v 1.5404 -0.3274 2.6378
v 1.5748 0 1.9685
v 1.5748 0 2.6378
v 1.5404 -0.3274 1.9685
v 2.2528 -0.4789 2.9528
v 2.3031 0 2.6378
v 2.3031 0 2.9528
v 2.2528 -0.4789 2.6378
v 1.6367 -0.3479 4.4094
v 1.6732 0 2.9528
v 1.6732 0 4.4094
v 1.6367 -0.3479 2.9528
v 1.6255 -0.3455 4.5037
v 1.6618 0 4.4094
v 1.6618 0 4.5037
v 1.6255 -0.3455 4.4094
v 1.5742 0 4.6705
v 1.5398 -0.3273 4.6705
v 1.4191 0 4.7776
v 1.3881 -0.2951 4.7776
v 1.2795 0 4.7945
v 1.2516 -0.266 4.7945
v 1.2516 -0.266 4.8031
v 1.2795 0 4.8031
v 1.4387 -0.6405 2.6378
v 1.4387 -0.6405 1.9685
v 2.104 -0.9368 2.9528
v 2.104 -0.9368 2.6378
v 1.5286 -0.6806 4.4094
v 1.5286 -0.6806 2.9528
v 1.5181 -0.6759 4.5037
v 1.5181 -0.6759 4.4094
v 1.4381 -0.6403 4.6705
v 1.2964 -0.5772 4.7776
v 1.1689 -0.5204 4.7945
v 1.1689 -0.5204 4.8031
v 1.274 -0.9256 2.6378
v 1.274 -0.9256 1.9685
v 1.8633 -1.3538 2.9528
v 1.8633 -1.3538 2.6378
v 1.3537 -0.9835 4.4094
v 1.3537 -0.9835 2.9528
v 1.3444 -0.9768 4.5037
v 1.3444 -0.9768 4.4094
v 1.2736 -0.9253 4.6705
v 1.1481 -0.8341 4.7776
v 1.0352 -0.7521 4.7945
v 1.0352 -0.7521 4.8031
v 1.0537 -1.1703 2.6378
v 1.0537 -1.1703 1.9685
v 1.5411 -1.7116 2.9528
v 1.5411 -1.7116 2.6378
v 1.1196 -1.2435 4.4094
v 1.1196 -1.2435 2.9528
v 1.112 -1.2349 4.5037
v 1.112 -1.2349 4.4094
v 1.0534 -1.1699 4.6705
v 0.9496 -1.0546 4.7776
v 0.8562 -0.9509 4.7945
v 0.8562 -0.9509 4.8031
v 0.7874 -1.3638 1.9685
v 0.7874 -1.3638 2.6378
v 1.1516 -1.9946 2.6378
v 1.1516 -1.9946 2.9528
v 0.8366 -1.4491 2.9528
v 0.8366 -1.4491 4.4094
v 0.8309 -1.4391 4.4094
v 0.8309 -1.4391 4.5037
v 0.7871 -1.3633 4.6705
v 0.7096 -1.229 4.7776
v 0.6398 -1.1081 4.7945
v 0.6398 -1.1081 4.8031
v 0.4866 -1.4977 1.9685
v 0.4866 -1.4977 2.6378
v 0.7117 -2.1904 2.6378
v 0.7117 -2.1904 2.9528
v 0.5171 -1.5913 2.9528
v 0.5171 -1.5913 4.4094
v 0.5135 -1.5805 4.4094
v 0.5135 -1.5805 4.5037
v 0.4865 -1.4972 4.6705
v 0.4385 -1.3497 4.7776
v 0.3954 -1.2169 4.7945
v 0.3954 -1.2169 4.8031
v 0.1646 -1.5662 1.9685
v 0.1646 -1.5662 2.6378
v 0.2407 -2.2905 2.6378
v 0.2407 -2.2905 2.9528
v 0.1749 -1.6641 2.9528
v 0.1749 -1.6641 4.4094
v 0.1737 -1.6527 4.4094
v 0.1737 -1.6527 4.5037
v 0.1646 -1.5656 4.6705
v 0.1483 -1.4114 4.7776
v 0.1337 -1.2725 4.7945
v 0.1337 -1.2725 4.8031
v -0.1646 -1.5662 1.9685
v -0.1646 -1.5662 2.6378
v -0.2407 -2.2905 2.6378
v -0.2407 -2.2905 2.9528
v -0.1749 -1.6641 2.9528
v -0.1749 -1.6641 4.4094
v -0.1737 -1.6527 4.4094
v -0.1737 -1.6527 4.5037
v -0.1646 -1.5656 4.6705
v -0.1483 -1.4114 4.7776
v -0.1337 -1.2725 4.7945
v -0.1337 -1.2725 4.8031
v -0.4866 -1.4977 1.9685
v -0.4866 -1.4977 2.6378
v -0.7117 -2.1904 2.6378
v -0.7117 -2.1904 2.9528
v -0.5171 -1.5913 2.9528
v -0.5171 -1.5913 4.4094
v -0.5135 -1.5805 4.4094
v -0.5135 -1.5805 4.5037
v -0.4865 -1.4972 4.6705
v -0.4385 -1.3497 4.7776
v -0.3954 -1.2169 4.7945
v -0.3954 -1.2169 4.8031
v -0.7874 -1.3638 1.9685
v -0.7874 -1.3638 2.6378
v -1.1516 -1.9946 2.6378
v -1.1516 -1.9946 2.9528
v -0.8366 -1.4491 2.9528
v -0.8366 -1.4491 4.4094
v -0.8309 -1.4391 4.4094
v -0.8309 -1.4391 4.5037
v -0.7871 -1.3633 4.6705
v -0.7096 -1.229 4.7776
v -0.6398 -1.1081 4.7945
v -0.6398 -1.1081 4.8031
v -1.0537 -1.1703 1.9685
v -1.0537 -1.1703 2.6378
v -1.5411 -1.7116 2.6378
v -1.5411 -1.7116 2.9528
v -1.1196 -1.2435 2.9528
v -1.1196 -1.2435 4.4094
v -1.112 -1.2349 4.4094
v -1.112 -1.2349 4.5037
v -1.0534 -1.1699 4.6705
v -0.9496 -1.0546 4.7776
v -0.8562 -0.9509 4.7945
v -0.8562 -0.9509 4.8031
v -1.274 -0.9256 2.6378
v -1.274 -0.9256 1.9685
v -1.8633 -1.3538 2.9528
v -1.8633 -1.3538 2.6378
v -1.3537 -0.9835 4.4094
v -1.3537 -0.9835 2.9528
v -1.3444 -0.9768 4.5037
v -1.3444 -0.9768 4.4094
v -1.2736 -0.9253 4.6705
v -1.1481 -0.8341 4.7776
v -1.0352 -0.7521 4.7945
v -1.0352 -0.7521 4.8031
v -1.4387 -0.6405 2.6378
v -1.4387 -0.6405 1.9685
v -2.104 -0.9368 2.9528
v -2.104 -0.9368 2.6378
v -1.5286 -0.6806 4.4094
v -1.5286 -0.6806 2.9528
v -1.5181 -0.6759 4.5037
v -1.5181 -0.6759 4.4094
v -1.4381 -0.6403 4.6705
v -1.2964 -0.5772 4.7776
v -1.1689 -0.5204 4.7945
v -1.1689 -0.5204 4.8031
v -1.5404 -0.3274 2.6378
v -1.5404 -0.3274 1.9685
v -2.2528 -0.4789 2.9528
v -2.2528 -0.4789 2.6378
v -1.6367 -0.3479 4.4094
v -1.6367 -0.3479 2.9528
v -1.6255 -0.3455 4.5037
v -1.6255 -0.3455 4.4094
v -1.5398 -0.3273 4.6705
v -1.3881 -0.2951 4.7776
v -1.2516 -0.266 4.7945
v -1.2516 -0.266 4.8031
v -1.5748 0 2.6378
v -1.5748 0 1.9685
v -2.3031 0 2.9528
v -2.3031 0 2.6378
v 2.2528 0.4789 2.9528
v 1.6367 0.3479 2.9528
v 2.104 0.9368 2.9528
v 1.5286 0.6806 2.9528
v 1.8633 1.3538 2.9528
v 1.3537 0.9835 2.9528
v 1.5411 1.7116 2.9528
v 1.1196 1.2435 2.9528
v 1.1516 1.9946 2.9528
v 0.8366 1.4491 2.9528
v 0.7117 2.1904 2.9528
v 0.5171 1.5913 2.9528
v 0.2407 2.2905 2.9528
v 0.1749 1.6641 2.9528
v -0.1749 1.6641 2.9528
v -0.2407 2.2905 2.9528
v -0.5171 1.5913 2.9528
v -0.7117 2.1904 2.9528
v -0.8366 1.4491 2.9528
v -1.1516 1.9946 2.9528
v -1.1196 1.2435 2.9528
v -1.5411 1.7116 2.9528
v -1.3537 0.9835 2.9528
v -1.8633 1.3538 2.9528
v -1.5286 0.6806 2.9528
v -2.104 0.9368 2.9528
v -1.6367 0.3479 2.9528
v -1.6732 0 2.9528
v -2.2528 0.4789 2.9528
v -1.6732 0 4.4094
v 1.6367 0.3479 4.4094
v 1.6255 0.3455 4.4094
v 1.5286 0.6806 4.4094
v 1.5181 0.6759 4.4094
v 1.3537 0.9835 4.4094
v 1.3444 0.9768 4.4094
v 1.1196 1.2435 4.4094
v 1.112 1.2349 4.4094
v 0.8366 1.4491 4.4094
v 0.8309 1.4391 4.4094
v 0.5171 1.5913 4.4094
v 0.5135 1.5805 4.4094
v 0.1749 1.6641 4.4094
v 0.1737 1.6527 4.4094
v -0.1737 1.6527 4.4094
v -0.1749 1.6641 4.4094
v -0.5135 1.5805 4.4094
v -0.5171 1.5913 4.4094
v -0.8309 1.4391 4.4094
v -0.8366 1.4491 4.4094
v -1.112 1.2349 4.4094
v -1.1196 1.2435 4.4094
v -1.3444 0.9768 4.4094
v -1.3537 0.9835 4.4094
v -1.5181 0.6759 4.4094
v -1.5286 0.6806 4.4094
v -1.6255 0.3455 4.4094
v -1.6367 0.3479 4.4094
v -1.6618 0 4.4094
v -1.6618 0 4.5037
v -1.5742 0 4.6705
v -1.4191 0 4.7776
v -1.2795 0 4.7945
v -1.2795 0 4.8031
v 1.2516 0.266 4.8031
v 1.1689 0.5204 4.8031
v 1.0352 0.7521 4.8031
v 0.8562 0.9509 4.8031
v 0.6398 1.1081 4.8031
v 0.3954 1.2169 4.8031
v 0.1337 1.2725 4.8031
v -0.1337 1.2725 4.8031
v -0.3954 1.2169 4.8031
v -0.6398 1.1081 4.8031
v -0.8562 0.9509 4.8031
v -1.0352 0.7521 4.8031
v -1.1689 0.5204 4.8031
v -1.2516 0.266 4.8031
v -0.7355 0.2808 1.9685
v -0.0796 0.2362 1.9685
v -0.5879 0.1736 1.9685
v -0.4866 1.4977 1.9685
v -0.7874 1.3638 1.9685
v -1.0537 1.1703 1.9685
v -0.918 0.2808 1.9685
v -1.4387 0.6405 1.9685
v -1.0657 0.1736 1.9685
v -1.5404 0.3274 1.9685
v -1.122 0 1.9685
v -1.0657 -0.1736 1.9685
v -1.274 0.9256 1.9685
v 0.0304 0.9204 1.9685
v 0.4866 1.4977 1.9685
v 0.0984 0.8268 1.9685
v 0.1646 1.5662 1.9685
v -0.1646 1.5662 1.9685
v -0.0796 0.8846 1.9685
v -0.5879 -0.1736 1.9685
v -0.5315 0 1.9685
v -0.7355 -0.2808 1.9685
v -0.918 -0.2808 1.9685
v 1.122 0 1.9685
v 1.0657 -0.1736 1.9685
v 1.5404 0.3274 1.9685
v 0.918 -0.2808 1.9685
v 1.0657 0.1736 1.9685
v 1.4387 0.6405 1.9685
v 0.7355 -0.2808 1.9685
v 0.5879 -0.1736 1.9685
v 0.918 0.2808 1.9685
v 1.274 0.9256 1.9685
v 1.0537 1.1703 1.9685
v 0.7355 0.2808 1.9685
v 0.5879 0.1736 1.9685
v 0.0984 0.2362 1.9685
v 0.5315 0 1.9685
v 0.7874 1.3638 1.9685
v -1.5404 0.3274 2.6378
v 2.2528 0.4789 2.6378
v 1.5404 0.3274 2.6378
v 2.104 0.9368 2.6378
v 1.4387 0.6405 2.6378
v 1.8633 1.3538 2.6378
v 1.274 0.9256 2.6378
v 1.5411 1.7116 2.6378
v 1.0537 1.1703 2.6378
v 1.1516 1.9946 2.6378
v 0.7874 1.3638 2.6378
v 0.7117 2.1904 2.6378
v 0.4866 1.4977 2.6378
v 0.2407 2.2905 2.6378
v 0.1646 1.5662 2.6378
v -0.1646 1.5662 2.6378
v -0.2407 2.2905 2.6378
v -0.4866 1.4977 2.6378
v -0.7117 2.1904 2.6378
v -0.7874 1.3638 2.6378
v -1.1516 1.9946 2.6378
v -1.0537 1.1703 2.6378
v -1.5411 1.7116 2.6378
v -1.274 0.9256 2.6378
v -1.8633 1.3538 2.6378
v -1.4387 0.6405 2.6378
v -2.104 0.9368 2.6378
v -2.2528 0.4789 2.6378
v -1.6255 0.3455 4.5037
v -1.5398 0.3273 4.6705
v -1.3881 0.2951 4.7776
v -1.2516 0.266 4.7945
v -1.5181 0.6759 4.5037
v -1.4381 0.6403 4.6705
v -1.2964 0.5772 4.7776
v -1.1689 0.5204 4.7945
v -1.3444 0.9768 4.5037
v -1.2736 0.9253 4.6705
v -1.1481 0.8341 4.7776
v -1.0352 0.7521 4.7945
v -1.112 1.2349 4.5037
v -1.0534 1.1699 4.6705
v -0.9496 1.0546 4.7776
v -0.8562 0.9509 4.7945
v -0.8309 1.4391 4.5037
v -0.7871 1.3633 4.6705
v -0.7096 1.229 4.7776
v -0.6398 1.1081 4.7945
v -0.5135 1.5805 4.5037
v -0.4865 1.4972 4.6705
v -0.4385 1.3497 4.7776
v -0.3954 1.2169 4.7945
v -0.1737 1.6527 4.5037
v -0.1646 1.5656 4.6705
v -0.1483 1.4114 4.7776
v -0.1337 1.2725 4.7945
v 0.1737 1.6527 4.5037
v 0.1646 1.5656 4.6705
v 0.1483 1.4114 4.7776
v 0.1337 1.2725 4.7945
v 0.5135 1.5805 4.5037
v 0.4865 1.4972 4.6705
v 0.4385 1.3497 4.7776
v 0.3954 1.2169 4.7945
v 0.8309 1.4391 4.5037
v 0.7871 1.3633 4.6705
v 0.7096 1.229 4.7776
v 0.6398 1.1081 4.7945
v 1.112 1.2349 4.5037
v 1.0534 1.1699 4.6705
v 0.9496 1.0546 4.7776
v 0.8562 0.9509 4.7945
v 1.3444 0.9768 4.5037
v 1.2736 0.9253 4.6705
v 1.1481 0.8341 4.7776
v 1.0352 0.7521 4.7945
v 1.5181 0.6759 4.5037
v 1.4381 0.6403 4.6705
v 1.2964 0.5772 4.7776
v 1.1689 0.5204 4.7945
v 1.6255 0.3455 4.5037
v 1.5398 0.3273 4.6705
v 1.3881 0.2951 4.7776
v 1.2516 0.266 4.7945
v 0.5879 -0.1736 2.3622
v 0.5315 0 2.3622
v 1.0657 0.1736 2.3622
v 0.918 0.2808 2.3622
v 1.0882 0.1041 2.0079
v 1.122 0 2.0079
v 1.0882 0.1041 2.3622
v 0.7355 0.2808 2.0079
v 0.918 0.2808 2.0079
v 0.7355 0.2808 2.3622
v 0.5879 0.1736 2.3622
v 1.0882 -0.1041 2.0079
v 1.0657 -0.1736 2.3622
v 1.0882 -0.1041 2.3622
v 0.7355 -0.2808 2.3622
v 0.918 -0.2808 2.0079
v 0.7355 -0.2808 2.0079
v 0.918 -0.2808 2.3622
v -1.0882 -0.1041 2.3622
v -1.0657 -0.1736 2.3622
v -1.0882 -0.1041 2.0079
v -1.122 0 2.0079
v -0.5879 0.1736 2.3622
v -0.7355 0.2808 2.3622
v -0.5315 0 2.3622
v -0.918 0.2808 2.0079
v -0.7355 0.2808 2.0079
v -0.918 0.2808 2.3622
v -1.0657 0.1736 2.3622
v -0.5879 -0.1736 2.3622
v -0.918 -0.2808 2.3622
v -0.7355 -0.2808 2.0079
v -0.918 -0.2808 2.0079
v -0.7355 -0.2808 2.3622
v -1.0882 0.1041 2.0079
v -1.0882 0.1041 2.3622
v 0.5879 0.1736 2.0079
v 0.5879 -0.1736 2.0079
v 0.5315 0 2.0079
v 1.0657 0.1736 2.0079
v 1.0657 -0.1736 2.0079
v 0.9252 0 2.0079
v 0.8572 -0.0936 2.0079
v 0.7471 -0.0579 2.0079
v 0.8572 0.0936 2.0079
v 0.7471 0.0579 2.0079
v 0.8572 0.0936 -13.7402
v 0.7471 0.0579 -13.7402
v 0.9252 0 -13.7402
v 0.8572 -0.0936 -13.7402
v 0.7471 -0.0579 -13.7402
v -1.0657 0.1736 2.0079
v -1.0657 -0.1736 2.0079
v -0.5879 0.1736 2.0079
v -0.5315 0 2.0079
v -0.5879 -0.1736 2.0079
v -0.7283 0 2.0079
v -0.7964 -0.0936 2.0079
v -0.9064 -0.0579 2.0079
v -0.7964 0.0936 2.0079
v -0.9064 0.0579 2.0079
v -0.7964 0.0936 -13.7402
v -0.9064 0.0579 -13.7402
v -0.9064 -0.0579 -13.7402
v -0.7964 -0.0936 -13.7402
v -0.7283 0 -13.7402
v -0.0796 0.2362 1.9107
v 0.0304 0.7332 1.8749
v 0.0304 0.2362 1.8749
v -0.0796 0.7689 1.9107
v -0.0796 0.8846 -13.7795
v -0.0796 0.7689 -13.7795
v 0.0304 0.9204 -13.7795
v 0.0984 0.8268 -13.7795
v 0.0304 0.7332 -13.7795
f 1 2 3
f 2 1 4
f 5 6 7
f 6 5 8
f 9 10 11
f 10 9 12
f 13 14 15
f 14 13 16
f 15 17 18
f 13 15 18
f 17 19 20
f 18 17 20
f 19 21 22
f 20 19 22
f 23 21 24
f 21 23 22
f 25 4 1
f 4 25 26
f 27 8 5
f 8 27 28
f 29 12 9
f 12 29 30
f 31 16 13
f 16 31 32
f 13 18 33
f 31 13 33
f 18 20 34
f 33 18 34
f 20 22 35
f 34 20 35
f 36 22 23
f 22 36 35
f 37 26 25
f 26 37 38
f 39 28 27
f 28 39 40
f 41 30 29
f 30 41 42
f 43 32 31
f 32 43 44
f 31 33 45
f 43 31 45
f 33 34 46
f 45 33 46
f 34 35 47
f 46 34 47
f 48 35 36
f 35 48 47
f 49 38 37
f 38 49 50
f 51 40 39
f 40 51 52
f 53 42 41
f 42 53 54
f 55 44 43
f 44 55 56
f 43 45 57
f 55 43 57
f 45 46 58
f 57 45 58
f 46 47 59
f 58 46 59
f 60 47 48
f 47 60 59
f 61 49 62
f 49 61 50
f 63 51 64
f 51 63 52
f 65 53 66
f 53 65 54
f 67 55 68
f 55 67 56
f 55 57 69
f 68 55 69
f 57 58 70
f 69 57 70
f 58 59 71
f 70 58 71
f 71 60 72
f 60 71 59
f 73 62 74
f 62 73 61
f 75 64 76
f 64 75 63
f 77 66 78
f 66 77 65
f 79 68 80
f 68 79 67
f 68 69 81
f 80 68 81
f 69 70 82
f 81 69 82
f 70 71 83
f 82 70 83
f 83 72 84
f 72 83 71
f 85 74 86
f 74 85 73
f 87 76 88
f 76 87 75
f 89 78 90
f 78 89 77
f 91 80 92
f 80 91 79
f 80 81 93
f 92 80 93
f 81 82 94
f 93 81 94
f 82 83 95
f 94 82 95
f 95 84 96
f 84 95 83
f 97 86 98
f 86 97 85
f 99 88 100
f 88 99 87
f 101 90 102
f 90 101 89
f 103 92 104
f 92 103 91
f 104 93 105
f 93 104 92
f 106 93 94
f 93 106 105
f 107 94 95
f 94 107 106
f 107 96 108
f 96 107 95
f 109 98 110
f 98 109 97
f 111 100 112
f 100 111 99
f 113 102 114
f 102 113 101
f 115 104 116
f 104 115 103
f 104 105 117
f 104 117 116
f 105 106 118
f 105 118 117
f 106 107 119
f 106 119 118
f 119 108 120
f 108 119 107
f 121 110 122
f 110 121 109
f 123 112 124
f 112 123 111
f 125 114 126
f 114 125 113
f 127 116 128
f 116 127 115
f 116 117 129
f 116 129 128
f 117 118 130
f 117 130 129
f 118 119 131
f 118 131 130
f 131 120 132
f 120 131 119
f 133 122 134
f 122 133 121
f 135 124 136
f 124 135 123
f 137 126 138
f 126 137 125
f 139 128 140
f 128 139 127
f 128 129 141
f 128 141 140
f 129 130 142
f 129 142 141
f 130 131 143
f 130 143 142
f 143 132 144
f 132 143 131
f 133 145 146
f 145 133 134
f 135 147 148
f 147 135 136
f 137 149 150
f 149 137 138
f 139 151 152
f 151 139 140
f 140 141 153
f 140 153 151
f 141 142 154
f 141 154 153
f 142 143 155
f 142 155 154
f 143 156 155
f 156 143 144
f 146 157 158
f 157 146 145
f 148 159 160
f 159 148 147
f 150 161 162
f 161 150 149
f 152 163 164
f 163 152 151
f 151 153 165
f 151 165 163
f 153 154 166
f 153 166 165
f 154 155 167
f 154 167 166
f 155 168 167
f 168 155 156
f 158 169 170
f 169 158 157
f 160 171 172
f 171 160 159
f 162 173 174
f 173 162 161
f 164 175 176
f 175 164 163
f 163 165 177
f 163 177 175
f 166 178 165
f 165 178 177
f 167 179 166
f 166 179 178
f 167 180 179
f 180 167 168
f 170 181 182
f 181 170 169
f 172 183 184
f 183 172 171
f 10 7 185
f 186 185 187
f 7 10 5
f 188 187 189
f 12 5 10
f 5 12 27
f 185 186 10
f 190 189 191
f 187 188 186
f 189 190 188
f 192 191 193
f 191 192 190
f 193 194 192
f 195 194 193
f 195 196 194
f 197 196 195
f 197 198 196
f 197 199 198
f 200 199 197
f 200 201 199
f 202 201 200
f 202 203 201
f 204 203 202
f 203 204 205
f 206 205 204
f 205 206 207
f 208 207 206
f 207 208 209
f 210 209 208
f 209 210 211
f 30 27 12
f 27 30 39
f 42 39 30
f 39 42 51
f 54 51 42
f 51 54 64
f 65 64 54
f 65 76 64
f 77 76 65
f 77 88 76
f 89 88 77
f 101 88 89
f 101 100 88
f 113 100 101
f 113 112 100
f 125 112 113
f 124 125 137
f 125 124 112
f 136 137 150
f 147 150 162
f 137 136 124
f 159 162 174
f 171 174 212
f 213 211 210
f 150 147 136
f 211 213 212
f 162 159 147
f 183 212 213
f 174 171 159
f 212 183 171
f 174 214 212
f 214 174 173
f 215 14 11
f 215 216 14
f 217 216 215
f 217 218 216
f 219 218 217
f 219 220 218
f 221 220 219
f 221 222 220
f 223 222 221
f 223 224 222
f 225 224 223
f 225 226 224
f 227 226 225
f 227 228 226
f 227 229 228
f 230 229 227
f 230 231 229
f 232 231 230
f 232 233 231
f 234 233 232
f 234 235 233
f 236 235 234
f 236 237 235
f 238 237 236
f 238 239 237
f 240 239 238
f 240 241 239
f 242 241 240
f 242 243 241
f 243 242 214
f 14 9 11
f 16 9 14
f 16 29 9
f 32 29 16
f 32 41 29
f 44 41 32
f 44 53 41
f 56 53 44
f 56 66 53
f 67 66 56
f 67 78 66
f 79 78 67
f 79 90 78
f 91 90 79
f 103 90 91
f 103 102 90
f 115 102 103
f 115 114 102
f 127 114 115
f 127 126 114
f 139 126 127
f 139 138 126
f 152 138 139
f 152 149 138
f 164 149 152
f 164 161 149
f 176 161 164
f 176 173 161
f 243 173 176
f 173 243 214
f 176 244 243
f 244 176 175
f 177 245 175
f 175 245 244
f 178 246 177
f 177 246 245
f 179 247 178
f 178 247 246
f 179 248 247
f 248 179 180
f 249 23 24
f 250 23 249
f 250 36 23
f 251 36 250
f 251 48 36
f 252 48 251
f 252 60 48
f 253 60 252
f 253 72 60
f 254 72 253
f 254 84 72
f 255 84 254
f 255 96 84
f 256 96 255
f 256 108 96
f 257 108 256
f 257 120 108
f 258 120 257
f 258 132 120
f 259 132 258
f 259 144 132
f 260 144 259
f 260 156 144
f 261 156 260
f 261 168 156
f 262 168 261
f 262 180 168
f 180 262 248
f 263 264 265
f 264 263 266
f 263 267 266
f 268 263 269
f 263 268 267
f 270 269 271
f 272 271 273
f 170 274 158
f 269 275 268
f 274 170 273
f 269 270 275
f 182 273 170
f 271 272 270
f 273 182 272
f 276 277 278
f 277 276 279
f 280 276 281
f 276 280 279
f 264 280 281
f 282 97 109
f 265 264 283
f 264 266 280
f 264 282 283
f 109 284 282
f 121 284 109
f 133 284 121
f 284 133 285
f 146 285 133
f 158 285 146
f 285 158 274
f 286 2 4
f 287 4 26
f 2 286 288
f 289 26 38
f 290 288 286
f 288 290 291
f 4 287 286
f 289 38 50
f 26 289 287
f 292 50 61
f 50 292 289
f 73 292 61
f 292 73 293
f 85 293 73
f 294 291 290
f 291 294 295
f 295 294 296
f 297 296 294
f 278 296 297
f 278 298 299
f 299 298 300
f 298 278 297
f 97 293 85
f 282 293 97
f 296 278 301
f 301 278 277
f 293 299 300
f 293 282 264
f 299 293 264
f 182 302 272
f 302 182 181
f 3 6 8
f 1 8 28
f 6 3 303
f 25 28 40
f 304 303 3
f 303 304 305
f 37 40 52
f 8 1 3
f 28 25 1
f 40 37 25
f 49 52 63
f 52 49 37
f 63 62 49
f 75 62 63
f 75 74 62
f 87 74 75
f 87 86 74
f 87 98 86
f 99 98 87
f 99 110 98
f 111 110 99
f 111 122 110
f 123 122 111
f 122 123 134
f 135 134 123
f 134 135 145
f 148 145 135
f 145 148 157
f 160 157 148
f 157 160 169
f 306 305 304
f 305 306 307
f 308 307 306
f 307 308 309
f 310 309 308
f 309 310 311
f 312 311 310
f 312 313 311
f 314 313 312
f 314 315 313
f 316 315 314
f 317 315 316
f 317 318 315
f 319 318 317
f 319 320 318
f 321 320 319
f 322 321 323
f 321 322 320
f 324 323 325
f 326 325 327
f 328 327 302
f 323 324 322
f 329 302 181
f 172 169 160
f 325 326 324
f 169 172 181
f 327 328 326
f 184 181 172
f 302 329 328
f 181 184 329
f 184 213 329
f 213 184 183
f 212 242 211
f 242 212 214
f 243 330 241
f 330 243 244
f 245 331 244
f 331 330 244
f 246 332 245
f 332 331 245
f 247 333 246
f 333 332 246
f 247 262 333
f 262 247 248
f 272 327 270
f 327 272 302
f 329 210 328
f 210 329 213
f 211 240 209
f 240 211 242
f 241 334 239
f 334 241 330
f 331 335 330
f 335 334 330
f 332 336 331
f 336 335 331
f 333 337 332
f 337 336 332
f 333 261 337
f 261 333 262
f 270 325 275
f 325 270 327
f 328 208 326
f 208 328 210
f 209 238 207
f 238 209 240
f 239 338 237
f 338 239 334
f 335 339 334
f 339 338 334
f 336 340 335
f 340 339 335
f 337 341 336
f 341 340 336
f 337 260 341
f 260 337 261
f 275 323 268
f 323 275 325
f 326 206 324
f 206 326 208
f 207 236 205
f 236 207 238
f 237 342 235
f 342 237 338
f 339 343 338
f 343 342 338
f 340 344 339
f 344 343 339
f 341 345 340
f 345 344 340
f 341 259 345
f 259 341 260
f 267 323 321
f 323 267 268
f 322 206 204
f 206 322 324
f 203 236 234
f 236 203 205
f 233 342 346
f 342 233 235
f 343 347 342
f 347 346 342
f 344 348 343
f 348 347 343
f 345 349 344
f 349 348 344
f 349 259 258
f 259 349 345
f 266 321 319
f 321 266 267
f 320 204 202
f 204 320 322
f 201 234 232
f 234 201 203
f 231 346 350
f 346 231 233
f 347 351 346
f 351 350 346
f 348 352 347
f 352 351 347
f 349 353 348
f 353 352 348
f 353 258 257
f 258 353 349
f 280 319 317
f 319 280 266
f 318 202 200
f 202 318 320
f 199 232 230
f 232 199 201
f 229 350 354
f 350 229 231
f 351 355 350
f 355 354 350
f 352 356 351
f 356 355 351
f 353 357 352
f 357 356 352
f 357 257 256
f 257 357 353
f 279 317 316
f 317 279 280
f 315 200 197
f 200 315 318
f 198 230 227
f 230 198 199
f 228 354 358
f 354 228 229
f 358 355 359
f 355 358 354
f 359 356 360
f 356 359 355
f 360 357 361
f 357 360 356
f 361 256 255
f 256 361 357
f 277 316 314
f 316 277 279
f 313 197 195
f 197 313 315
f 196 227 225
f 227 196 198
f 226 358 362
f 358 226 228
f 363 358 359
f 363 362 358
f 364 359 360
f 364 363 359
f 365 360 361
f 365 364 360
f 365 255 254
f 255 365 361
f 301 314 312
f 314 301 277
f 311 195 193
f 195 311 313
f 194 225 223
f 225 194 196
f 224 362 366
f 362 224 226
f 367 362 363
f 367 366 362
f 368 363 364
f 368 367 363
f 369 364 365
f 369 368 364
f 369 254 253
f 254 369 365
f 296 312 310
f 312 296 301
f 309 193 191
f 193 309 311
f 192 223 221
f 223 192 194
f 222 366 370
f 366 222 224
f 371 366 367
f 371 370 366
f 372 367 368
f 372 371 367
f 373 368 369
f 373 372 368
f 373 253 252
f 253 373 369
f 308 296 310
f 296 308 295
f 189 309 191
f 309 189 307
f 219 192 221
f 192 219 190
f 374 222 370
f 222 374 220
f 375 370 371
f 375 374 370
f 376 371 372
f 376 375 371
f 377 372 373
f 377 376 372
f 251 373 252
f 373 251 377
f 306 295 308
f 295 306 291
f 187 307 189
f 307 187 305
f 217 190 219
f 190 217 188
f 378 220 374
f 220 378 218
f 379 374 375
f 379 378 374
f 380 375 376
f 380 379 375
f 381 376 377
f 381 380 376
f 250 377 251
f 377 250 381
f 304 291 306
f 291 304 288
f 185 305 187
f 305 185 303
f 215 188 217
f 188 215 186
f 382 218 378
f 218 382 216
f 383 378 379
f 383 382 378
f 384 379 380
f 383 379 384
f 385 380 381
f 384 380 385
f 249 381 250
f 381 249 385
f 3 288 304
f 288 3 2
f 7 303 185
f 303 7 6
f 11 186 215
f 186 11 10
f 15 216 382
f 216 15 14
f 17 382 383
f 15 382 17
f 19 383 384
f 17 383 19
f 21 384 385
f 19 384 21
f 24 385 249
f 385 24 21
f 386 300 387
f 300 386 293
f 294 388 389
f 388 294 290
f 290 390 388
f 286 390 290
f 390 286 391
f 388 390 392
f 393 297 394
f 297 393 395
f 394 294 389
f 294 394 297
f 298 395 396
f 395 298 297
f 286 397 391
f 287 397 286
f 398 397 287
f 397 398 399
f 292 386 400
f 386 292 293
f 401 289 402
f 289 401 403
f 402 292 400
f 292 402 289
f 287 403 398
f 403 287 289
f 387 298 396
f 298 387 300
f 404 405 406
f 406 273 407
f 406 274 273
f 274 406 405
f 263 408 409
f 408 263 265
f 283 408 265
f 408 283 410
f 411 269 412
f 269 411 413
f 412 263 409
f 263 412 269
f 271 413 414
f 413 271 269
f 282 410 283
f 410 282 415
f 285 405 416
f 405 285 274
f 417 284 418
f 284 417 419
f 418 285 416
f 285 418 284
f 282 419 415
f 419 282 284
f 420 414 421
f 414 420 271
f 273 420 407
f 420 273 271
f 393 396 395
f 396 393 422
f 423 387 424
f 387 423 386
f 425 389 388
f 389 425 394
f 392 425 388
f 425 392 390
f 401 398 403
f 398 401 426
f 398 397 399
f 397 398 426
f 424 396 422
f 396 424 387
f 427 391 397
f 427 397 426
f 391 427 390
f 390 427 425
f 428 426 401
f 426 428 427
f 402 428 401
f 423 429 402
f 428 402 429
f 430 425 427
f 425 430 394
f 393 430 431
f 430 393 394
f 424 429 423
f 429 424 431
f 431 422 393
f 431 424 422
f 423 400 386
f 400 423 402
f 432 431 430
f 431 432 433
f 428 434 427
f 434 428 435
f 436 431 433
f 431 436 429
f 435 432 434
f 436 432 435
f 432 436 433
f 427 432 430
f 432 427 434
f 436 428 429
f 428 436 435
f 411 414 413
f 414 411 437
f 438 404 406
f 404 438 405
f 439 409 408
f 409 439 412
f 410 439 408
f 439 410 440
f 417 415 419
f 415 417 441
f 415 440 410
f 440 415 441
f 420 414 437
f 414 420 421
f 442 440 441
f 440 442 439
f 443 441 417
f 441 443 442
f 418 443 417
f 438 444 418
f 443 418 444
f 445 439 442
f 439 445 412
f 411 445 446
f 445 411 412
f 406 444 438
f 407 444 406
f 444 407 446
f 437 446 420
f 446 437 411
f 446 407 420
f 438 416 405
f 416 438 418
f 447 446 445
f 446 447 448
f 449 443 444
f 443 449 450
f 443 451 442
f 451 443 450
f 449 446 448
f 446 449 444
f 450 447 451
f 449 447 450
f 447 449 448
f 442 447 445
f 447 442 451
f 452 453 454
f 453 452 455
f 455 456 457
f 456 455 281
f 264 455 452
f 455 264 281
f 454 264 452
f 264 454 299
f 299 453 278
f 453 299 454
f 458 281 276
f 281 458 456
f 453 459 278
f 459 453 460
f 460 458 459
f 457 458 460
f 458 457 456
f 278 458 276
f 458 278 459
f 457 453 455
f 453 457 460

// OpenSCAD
$fs = .5;

module transistor() {
	d1 = 8; h1 = 1.7;
	d2 = 11.7; h2 = 0.8;
	d3 = 8.5; h3 = 4.7; r3 = 1;
	pd = 0.5;
	union() {
		color("silver")
		difference() {
			rotate_extrude() {
					translate([-d1/2, 0])
					square([d1/2, h1]);
					translate([-d2/2, h1])
					square([d2/2, h2]);
					translate([-d3/2, h1+h2])
					square([d3/2, h3 - r3]);
					translate([-(d3-r3*2)/2, h1+h2+h3-r3])
					square([d3/2-r3, r3]);
					translate([-(d3-r3*2)/2, h1+h2+h3-r3])
					circle(r3);
			}
			
			translate([2.1, 0, -1]) cylinder(d = 1.5, h = 2);
			translate([-2.1, 0, -1]) cylinder(d = 1.5, h = 2);
		}
		translate([2.1, 0, 0.1]) {
			color([0.1, 0.1, 0.1]) cylinder(d = 1.5, h = 2);
			color("silver") rotate([180, 0, 0]) cylinder(d = pd, h = 40);
		}
		translate([-2.1, 0, 0.1]) {
			color([0.1, 0.1, 0.1]) cylinder(d = 1.5, h = 2);
			color("silver") rotate([180, 0, 0]) cylinder(d = pd, h = 40);
		}
		color("silver")
		translate([0, 2.1, 0])
		rotate([90, 0, 0])
		cylinder(h = pd*3, d = pd);
		color("silver")
		translate([0, 2.1, 0])
		rotate([180, 0, 0])
		cylinder(d = pd, h = 40);
	}
}

_inch = 1/2.54;
scale([_inch, _inch, _inch]) {
	translate([0, 0, 5])
	transistor();
}
